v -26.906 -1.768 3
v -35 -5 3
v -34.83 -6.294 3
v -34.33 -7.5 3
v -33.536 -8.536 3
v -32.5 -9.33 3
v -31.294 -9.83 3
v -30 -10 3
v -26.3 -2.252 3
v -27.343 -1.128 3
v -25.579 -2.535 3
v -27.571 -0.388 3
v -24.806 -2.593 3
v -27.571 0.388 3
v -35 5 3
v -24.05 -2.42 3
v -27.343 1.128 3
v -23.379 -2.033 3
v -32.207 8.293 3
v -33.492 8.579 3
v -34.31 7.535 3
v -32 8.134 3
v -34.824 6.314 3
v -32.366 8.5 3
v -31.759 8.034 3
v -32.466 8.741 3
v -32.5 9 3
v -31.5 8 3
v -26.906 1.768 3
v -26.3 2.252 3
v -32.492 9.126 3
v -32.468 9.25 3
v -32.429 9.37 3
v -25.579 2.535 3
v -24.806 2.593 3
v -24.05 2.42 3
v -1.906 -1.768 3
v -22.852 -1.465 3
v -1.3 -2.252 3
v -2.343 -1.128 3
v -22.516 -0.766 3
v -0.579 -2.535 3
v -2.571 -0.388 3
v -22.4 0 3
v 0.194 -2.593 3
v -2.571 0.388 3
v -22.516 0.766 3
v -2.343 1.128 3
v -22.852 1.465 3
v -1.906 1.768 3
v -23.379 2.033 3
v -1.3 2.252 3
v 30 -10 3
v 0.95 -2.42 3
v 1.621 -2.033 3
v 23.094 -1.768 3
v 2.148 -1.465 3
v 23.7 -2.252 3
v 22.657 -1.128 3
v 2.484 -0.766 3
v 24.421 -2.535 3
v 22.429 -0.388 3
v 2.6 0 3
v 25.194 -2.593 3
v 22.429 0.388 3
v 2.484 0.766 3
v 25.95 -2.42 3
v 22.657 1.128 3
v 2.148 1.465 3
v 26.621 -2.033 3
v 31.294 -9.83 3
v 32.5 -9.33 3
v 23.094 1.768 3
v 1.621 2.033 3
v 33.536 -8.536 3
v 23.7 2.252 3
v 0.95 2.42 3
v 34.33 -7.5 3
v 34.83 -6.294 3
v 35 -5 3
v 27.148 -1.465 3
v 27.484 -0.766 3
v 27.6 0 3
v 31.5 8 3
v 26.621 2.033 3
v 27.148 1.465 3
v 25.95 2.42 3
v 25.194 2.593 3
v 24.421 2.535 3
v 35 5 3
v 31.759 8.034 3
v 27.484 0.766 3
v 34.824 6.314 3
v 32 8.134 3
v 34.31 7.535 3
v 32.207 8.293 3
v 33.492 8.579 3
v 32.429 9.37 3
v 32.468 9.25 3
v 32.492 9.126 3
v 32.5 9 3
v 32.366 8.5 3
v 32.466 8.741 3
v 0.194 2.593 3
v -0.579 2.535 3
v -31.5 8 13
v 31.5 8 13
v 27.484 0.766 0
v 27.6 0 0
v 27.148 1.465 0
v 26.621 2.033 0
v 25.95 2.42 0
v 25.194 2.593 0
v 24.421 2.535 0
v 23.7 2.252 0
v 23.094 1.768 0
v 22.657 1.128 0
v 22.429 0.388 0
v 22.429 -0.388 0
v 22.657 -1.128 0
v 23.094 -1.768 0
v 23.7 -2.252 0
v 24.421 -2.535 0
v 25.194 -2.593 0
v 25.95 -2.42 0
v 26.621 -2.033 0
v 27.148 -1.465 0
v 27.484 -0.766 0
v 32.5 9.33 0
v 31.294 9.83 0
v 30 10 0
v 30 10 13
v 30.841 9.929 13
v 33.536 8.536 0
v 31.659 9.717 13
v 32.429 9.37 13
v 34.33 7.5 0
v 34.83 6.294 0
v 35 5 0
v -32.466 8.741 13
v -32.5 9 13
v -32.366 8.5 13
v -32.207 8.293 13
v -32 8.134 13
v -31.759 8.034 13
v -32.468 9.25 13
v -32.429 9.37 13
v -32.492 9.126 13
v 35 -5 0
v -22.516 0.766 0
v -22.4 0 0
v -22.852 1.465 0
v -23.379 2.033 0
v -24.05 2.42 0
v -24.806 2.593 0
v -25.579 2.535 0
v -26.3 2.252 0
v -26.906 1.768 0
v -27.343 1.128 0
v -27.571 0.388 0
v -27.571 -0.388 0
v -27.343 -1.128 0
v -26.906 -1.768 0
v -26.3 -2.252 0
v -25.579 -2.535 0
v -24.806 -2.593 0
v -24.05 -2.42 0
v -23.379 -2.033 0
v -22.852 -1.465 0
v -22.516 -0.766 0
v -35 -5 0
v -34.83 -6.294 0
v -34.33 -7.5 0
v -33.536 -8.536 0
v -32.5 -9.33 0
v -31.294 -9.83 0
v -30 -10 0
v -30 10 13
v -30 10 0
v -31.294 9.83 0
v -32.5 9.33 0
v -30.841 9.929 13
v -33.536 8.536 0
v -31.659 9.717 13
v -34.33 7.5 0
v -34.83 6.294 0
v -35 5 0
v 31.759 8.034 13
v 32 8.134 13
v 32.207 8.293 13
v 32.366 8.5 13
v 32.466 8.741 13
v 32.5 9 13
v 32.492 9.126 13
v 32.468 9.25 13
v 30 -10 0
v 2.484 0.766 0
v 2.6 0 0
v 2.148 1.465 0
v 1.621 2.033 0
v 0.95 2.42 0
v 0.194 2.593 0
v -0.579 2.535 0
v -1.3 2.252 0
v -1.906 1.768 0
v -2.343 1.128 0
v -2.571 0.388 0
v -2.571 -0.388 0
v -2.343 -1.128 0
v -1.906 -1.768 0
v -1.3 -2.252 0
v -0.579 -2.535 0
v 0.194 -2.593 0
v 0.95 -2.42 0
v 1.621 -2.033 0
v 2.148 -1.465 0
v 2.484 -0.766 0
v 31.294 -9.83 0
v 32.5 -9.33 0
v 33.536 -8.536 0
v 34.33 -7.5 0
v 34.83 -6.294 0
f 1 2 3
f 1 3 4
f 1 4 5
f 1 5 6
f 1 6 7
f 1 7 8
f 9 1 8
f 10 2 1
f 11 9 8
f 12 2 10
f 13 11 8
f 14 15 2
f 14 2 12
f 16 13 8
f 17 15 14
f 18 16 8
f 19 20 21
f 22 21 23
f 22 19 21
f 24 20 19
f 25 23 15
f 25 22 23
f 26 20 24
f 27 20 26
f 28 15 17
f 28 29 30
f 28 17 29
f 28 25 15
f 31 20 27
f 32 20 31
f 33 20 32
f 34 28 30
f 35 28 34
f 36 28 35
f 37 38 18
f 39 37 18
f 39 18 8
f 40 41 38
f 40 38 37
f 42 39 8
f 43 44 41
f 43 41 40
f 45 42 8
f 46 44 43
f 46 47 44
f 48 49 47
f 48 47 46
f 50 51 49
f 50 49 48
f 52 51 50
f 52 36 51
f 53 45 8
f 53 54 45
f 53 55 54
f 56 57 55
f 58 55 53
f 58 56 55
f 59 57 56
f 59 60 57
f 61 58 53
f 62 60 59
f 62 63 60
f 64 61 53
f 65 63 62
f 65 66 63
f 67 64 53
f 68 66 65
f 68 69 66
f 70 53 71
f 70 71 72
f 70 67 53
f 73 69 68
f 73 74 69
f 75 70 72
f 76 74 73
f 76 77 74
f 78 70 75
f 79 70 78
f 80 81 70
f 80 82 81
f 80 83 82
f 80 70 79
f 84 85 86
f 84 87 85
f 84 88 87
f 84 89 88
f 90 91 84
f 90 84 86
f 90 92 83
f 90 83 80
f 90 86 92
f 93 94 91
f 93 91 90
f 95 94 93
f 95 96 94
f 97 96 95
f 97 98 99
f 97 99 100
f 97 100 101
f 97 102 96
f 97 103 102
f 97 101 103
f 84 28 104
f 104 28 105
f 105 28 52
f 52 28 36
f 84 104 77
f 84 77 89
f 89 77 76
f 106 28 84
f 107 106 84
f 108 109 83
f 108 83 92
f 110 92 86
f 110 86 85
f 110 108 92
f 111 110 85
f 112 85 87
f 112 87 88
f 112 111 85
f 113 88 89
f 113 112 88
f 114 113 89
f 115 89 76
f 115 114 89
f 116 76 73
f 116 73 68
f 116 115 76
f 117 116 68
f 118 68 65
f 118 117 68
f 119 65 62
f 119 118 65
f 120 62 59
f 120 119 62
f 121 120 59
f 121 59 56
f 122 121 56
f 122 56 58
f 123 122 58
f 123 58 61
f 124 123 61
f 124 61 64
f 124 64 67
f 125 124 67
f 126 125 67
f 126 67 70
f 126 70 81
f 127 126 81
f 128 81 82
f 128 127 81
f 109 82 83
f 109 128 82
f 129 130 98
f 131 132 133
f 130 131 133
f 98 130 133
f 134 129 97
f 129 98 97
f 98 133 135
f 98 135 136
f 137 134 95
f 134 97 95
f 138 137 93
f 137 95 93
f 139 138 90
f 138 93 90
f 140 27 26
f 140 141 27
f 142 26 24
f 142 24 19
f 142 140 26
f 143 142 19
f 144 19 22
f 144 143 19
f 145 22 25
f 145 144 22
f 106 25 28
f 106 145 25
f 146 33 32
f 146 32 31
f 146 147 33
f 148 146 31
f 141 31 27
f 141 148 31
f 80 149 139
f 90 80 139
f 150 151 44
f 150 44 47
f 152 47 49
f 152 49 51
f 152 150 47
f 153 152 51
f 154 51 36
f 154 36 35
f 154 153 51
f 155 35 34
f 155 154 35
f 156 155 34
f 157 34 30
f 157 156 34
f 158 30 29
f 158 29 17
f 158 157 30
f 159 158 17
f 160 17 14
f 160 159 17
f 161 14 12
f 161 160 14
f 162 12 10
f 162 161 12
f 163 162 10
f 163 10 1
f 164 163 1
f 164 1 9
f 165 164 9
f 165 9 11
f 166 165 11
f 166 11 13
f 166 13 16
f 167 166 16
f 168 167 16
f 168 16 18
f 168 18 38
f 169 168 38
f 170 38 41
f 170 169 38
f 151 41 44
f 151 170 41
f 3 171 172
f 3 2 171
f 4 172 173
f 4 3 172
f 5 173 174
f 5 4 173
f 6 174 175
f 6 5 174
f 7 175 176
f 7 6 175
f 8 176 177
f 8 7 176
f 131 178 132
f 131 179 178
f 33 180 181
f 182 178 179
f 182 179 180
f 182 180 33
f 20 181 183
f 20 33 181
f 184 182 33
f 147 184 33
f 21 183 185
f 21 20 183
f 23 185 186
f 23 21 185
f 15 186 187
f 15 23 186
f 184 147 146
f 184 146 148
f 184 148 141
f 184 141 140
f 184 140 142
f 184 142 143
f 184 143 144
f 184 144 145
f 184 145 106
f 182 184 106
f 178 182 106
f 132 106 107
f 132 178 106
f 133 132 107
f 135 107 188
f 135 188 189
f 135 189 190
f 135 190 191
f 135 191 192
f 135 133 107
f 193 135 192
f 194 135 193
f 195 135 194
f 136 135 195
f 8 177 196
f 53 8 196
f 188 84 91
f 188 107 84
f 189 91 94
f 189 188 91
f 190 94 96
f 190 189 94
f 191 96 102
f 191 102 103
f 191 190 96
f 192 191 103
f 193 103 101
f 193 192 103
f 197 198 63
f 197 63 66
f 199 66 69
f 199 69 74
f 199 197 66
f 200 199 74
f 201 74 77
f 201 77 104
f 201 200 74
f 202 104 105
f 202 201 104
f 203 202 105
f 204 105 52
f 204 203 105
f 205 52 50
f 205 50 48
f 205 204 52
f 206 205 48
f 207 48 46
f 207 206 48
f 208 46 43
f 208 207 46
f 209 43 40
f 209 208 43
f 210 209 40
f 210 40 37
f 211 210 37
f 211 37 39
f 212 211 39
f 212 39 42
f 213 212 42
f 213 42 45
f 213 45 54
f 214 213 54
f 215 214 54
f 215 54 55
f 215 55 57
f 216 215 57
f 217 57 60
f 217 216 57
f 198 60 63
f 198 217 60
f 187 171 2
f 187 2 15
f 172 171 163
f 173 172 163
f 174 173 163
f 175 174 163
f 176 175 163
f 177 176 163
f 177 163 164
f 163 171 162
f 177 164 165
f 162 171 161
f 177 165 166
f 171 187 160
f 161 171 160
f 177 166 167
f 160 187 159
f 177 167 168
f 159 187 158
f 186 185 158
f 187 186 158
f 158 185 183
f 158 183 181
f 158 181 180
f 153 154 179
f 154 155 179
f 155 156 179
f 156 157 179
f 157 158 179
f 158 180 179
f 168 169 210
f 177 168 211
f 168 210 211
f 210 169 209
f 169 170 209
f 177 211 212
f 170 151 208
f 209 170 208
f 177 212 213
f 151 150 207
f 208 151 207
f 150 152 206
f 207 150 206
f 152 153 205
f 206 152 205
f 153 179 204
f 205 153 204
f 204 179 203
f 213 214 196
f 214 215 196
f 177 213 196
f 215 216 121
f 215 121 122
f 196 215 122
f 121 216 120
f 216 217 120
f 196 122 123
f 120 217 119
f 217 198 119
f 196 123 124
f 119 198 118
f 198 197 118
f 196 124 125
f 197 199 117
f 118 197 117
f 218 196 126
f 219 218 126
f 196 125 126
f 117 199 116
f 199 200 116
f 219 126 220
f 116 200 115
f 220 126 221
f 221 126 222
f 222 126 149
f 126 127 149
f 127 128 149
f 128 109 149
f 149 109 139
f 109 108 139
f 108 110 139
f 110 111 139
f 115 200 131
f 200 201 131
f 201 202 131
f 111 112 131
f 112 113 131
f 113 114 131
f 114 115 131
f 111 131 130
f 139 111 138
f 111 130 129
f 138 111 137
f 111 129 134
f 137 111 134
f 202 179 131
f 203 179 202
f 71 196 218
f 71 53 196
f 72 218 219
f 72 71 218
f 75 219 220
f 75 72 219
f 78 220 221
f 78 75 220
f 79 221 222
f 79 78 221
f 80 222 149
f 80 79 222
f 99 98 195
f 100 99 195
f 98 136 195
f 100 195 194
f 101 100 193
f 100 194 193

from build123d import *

# Parameters (mm, degrees)
SKETCH_2_W      = 70
SKETCH_2_H      = 20
SKETCH_2_R      = 2.6
EXTRUDE_1_DEPTH = 3
SKETCH_3_W      = 65
SKETCH_3_H      = 2
EXTRUDE_2_DEPTH = 10
FILLET_1_R      = 1
FILLET_2_R      = 5


with BuildPart() as part:
    # ｽｹｯﾁ2 → ﾎﾞｽ - 押し出し1 (new body)
    with BuildSketch(Plane.XY):
        Rectangle(SKETCH_2_W, SKETCH_2_H)
        with Locations((-25, 0)):
            Circle(SKETCH_2_R, mode=Mode.SUBTRACT)
        with Locations((25, 0)):
            Circle(SKETCH_2_R, mode=Mode.SUBTRACT)
        Circle(SKETCH_2_R, mode=Mode.SUBTRACT)
    extrude(amount=EXTRUDE_1_DEPTH)

    # ｽｹｯﾁ3 → ﾎﾞｽ - 押し出し2 (add)
    with BuildSketch(Plane.XY.offset(3)):
        with Locations((0, 9)):
            Rectangle(SKETCH_3_W, SKETCH_3_H)
    extrude(amount=EXTRUDE_2_DEPTH)

    # ﾌｨﾚｯﾄ1
    fillet_1_edges = [part.edges().sort_by_distance(p)[0] for p in [
        (-32.5, 10, 8),
        (-32.5, 8, 8),
        (32.5, 10, 8),
        (32.5, 8, 8),
    ]]
    fillet(fillet_1_edges, radius=FILLET_1_R - 0.0001)  # a hair under: the kernel refuses the full size

    # ﾌｨﾚｯﾄ2
    fillet_2_edges = [part.edges().sort_by_distance(p)[0] for p in [
        (-35, -10, 1.5),
        (-35, 10, 1.5),
        (35, -10, 1.5),
        (35, 10, 1.5),
    ]]
    fillet(fillet_2_edges, radius=FILLET_2_R)


solid = part.part
